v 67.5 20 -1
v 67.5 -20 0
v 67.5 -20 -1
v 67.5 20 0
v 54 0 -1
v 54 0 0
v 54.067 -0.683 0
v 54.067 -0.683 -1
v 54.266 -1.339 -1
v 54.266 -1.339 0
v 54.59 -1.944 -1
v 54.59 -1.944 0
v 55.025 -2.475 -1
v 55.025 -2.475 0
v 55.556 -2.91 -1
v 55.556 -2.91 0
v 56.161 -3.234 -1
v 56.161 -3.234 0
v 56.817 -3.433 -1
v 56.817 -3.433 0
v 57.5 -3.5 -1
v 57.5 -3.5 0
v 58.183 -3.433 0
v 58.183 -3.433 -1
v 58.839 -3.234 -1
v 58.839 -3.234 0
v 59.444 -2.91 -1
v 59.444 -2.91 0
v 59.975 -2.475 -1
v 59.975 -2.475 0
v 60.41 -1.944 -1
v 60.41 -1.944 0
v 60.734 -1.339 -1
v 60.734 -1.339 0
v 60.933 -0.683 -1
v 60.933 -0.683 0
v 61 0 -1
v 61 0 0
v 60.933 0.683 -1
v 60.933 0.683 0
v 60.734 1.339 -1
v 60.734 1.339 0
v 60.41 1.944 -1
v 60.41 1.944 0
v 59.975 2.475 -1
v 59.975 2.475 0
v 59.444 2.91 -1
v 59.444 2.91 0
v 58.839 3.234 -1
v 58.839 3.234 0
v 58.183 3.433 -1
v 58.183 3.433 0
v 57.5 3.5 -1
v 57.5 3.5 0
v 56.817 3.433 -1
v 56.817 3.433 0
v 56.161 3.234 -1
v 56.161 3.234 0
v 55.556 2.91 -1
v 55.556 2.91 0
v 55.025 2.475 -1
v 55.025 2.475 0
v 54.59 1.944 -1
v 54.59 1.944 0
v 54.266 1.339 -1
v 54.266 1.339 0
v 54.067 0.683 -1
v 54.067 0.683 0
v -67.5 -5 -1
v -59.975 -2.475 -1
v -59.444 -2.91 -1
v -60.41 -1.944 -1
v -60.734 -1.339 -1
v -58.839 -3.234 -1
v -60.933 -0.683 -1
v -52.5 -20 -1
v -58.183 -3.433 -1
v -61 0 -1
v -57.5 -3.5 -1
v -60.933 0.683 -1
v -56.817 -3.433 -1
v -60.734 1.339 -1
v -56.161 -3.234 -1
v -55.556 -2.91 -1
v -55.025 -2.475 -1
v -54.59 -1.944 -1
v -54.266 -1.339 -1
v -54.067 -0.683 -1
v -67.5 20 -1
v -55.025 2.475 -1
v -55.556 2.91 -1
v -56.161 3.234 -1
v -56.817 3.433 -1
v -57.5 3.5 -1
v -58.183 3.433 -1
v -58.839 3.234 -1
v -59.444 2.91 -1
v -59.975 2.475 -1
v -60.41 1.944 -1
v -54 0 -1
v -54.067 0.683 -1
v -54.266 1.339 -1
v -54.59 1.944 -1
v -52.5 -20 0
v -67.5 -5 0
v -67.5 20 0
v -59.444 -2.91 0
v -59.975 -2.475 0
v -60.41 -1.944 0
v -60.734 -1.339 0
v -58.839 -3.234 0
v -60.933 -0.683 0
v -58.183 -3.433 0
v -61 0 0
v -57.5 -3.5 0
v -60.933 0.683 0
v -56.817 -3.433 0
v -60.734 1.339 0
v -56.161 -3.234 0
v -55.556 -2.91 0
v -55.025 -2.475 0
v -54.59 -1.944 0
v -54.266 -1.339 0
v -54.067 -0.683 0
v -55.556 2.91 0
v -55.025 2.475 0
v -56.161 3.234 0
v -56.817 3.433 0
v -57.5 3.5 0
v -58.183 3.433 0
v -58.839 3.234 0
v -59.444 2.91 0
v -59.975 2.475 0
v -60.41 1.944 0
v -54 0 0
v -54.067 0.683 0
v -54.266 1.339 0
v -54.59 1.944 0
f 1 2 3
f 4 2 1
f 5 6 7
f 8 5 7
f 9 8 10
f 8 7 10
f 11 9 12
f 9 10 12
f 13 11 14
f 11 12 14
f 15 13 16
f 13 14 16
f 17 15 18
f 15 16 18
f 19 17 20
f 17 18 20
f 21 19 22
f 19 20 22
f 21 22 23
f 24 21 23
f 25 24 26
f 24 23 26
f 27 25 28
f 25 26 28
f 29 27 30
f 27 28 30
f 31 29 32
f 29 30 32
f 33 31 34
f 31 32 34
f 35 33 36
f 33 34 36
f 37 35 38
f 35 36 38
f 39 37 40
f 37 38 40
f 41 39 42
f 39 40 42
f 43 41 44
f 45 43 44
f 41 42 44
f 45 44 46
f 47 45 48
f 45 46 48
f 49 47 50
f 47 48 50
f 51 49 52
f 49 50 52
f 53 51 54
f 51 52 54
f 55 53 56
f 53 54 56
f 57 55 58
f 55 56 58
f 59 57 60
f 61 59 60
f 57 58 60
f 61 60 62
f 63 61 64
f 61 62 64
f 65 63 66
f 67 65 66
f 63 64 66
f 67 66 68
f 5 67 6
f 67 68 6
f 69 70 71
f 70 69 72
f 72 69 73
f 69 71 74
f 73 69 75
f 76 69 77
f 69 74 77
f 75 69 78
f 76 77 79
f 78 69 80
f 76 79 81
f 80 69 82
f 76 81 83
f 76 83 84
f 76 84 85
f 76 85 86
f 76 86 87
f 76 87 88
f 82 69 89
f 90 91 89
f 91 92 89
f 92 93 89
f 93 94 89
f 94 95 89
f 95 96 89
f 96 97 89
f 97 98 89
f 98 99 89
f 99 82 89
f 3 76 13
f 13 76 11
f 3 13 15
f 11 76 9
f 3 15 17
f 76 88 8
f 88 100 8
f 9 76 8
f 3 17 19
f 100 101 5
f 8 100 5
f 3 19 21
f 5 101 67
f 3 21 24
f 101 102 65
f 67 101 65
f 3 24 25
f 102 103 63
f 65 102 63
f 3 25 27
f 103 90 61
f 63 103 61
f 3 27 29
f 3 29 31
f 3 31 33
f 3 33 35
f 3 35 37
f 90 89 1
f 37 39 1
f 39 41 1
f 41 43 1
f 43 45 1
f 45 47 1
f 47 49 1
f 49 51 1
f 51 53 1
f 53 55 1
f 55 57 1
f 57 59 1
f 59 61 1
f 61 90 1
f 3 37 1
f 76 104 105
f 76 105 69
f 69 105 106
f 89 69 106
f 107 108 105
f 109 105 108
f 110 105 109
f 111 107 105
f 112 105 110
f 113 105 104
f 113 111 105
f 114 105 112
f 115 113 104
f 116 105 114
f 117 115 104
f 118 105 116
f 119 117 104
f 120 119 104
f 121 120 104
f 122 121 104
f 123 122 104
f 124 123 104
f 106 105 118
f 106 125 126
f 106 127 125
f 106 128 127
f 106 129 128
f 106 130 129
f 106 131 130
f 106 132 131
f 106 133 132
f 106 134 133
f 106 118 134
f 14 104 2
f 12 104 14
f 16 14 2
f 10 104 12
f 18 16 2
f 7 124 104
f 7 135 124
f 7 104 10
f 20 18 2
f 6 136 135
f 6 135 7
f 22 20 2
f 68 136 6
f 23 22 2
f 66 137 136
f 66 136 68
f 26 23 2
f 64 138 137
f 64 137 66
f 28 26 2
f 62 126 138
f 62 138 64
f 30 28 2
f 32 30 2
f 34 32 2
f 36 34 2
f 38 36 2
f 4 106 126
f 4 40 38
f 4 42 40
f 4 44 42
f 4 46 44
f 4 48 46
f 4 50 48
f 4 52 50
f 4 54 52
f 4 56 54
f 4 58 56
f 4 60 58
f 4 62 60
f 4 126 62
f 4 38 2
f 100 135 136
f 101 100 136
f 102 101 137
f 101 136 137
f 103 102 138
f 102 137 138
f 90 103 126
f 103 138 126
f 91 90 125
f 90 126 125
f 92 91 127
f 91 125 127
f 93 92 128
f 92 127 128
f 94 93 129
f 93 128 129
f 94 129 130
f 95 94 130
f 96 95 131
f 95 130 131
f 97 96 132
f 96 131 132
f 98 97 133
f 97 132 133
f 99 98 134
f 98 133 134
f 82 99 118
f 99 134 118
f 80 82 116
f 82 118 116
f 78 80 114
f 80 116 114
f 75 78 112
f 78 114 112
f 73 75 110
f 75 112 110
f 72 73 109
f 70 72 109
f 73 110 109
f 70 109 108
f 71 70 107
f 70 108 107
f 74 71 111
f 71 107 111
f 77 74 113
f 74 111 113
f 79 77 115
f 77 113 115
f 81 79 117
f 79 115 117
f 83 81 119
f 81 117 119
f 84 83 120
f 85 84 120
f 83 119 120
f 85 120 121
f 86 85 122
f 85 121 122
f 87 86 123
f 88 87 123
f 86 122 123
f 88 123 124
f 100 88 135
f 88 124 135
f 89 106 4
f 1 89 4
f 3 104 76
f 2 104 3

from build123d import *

# Parameters (mm, degrees)
SKETCH_1_W             = 135
SKETCH_1_H             = 40
SKETCH_1_R             = 3.5
SM_BASE_FLANGE_1_DEPTH = 1
CHAMFER_1_SIZE         = 15


# Sheet-metal steps are written as plain solids
with BuildPart() as part:
    # Sketch 1 → Базовая кромка1 (new body)
    with BuildSketch(Plane.XY):
        Rectangle(SKETCH_1_W, SKETCH_1_H)
        with Locations((-57.5, 0)):
            Circle(SKETCH_1_R, mode=Mode.SUBTRACT)
        with Locations(Location((57.5, 0, 0), (0, 0, 180))):
            Circle(SKETCH_1_R, mode=Mode.SUBTRACT)
    extrude(amount=-SM_BASE_FLANGE_1_DEPTH)

    # Фаска1
    chamfer_1_edges = [part.edges().sort_by_distance(p)[0] for p in [
        (-67.5, -20, -0.5),
    ]]
    chamfer(chamfer_1_edges, length=CHAMFER_1_SIZE)


solid = part.part
